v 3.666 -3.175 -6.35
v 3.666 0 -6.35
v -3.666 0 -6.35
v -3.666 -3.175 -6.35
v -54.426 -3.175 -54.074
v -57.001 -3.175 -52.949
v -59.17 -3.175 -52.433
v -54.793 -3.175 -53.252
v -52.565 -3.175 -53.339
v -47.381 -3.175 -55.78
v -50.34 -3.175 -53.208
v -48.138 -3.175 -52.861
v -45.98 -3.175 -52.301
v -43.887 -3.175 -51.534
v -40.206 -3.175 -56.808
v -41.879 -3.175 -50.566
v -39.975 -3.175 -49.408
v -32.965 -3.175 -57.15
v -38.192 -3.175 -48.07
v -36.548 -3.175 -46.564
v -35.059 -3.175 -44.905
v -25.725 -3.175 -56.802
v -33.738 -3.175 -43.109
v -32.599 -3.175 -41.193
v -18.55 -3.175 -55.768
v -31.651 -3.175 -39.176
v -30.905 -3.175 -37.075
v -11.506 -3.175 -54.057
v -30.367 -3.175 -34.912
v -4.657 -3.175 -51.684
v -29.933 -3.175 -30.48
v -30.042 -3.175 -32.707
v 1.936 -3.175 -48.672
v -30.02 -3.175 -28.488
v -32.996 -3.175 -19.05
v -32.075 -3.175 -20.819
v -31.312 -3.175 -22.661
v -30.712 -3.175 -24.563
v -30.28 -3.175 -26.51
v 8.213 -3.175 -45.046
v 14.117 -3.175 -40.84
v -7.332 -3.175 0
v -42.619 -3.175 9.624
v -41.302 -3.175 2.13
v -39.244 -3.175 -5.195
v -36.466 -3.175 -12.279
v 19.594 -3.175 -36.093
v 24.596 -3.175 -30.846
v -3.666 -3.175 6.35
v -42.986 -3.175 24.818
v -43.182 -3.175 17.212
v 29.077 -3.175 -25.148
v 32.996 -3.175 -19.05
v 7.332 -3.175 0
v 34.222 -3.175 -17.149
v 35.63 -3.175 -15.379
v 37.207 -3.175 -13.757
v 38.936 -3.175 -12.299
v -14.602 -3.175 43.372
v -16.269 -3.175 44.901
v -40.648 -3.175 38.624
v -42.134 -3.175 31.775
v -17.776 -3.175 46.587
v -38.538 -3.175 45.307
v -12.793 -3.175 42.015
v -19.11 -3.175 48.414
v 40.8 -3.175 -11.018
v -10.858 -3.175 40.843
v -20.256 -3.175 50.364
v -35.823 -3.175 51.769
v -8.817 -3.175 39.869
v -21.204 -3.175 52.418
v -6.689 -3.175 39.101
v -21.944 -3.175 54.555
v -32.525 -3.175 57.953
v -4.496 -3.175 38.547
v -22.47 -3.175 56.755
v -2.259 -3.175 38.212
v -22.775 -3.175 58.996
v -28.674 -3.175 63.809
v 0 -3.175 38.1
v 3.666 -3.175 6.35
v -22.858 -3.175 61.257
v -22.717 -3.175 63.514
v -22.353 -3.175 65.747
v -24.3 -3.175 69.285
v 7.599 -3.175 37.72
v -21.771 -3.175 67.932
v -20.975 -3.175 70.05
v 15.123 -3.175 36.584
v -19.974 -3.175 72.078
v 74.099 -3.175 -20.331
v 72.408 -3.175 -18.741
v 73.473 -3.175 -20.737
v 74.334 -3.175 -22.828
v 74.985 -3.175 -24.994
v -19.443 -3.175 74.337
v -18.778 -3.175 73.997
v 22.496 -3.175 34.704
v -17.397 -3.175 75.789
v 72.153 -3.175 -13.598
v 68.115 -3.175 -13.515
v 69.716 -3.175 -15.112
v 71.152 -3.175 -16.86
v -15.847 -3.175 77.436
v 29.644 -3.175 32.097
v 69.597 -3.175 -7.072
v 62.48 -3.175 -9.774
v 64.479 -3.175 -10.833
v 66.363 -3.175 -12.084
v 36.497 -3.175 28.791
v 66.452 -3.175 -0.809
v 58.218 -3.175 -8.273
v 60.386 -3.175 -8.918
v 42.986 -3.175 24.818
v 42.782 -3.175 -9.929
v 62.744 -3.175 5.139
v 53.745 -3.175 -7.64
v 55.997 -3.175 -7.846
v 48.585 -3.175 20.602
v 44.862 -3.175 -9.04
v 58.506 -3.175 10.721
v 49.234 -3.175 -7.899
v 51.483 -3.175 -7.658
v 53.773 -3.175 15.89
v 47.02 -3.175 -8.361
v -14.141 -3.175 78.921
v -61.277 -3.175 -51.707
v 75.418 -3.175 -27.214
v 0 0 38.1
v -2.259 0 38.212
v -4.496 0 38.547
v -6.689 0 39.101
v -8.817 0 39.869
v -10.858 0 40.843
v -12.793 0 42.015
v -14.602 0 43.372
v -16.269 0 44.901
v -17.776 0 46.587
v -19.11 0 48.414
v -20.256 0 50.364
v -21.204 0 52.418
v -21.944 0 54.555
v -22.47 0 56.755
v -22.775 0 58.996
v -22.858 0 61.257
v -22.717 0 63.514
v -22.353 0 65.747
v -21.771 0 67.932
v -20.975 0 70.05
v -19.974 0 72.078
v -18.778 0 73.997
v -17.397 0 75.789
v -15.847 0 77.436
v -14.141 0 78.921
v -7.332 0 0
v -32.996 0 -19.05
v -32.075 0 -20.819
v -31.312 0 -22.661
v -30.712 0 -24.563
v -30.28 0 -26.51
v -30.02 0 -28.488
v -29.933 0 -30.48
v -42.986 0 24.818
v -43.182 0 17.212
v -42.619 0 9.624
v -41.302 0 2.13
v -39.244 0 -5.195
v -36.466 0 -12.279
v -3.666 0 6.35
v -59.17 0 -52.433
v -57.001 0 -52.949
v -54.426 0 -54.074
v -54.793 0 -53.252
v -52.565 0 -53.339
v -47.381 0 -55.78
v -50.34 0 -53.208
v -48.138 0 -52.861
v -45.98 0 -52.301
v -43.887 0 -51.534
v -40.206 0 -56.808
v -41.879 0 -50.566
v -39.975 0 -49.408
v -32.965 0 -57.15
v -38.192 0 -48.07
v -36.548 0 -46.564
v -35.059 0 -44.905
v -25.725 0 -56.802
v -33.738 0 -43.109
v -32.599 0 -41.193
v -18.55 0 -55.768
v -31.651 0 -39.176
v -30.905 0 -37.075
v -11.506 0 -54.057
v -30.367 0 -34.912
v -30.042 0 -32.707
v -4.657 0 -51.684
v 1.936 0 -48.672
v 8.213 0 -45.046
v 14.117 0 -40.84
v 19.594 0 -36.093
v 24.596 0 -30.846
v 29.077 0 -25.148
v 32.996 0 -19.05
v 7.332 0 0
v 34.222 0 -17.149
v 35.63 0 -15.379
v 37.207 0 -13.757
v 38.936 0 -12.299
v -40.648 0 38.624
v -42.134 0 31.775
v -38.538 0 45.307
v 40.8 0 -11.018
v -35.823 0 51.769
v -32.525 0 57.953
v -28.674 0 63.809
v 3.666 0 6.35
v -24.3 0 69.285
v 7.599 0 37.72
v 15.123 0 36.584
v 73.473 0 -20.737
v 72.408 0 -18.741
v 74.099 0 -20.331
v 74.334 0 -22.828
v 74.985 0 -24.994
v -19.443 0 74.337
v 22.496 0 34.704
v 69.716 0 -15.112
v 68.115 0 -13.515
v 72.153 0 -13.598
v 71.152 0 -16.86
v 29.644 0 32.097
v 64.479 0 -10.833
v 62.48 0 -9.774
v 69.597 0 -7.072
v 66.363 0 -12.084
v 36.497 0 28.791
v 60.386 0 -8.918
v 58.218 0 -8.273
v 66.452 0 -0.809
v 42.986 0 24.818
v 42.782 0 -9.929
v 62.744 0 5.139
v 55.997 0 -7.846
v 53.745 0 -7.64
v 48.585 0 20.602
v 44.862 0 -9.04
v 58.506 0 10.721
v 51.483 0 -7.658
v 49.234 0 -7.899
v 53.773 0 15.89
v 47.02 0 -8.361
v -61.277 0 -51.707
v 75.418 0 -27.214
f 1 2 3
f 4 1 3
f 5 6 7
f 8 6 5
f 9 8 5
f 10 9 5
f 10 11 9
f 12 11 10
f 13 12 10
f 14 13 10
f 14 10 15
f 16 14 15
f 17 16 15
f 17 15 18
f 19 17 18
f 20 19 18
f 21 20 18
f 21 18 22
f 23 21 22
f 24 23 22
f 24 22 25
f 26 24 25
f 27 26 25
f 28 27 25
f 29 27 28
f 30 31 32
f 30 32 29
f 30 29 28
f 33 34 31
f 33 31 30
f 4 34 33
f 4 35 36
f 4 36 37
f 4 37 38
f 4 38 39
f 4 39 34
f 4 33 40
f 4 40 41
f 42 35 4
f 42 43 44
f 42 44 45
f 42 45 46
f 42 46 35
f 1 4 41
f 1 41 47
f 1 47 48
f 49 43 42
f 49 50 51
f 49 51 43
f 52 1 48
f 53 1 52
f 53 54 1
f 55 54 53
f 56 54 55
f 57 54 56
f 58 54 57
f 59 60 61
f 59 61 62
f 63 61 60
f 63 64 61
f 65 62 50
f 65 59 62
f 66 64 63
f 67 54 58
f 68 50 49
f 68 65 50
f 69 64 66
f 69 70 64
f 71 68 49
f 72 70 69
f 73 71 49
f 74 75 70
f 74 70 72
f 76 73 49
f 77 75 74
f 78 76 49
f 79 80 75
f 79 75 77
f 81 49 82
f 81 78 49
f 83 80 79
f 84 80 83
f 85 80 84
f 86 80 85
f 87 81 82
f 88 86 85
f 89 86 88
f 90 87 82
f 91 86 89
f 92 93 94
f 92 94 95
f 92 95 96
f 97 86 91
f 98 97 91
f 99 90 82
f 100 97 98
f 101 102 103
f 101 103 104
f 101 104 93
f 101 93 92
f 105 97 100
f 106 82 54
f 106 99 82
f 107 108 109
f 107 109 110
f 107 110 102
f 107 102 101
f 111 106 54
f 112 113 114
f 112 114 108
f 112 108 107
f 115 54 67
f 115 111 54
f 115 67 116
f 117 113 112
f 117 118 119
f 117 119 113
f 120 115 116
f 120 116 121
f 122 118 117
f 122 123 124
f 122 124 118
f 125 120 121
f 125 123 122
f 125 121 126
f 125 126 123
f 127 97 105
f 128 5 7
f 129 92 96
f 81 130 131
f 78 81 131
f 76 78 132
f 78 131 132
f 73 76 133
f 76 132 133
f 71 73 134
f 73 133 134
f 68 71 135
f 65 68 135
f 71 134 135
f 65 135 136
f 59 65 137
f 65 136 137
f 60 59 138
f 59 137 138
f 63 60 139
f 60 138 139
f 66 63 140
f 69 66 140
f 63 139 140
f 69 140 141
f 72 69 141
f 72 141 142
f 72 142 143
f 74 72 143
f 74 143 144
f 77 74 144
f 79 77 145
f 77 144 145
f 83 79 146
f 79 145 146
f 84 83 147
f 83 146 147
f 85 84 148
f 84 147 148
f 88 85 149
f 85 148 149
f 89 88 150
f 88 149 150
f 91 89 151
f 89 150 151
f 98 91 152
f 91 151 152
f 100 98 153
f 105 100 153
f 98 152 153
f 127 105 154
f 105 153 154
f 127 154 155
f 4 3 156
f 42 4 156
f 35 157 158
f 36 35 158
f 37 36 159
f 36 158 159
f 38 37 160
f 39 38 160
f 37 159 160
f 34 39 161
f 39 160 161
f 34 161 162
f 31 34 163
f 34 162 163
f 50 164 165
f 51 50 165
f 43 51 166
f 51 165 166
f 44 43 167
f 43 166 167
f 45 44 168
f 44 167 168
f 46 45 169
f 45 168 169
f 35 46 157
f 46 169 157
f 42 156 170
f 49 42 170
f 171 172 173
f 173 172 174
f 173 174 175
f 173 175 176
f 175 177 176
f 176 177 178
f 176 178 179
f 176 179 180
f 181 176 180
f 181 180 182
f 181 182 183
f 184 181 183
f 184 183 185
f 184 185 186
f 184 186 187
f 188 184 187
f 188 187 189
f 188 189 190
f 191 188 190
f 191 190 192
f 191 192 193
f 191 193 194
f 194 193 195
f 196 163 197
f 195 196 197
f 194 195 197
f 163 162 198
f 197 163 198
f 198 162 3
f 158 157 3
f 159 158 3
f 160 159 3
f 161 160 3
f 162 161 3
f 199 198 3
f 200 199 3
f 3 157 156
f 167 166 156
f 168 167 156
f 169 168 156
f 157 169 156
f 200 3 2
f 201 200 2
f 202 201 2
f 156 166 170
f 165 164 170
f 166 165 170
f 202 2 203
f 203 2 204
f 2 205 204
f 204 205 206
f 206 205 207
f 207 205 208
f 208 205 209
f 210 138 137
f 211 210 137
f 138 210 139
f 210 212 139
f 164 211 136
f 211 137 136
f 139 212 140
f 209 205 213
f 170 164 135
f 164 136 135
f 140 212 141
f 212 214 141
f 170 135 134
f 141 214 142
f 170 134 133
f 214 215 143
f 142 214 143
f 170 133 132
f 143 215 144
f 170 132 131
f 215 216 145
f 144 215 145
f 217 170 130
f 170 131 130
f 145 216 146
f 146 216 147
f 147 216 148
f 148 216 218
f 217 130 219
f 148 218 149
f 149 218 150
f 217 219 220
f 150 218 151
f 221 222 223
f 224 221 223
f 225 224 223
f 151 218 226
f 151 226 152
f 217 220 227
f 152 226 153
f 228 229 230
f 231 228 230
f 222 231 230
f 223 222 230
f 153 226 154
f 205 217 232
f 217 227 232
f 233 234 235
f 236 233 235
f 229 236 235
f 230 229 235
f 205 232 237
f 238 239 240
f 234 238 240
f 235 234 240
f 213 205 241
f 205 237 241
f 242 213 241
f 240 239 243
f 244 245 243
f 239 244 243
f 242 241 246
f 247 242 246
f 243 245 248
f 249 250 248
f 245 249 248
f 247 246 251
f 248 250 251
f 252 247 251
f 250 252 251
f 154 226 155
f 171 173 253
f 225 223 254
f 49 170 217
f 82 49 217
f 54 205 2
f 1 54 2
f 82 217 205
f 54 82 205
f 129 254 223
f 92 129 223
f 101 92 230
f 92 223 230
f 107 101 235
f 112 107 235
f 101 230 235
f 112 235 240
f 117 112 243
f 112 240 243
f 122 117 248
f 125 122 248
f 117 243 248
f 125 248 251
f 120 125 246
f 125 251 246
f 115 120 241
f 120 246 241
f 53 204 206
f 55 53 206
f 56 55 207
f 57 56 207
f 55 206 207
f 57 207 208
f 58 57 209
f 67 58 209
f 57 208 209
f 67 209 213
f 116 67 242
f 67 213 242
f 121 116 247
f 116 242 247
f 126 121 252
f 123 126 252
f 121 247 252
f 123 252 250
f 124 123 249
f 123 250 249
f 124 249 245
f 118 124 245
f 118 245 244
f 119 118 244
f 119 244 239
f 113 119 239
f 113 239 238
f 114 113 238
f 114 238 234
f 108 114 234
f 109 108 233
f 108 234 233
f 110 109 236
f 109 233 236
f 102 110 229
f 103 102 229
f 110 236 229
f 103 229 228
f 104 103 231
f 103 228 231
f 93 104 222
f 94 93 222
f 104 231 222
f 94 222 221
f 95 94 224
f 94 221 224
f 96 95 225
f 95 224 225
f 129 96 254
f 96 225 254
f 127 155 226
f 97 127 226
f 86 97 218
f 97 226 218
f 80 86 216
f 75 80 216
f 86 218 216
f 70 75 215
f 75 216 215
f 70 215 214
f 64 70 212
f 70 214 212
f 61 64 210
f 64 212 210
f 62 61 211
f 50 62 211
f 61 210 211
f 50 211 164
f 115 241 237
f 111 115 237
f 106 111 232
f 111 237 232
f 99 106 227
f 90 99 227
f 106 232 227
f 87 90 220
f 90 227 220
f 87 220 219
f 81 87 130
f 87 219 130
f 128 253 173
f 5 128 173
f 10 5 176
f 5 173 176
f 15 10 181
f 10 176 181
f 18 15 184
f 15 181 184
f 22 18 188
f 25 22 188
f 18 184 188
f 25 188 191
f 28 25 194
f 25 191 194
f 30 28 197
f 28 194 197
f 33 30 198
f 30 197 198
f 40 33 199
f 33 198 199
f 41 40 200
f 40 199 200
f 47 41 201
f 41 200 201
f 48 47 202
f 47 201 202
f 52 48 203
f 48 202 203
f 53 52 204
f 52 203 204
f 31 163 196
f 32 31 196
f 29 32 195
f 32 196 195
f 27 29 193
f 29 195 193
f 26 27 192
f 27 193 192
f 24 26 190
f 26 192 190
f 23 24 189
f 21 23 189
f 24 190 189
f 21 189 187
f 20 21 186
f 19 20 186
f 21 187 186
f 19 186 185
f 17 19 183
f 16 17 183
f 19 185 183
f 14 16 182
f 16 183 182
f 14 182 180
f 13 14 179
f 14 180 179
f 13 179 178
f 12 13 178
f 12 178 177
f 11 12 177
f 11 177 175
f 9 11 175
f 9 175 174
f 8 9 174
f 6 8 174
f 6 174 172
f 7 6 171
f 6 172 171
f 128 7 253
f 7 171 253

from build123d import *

# Parameters (mm, degrees)
F1_DEPTH = 3.175


with BuildPart() as f1:
    # F0 (on Front) → F1 (new body)
    with BuildSketch(Plane.XZ):
        with BuildLine():
            ThreePointArc((32.9955675162, -19.0500006373), (36.8017738864, -9.8610059738), (38.1, 0))
            ThreePointArc((38.1, 0), (26.9407683703, 26.9407683561), (2.01e-08, 38.1))
            ThreePointArc((2.01e-08, 38.1), (-32.9955680289, 19.0499997494), (-32.9955675847, -19.0500005187))
            ThreePointArc((-32.9955675847, -19.0500005187), (-6.85e-08, -38.1), (32.9955675162, -19.0500006373))
        make_face()
        Polygon((3.6661742094, 6.35), (7.3323484187, 0), (3.6661742094, -6.35), (-3.6661742094, -6.35), (-7.3323484187, 0), (-3.6661742094, 6.35), align=None, mode=Mode.SUBTRACT)
        with BuildLine():
            ThreePointArc((2.01e-08, 38.1), (26.9407683703, 26.9407683561), (38.1, 0))
            ThreePointArc((38.1, 0), (36.8017738864, -9.8610059738), (32.9955675162, -19.0500006373))
            ThreePointArc((32.9955675162, -19.0500006373), (40.6079799838, -0.6720115922), (43.2044321158, 19.05))
            ThreePointArc((43.2044321158, 19.05), (43.1497599719, 21.9360086092), (42.9858219927, 24.8178758988))
            ThreePointArc((42.9858219927, 24.8178758988), (22.4955313049, 34.7037847321), (2.01e-08, 38.1))
        make_face()
        with BuildLine():
            ThreePointArc((-32.9955675847, -19.0500005187), (-32.9955680289, 19.0499997494), (2.01e-08, 38.1))
            ThreePointArc((2.01e-08, 38.1), (-22.4955312856, 34.703784738), (-42.9858219927, 24.8178758988))
            ThreePointArc((-42.9858219927, 24.8178758988), (-41.3021247691, 2.1298089138), (-32.9955675847, -19.0500005187))
        make_face()
        with BuildLine():
            ThreePointArc((-42.9858219927, 24.8178758988), (-22.4955312856, 34.703784738), (2.01e-08, 38.1))
            ThreePointArc((2.01e-08, 38.1), (-21.6006695494, 53.4773083041), (-14.1409580475, 78.92142827))
            ThreePointArc((-14.1409580475, 78.92142827), (-34.2450737922, 54.8987950557), (-42.9858219927, 24.8178758988))
        make_face()
        with BuildLine():
            ThreePointArc((0, -49.6357517976), (18.8065932705, -36.833594191), (32.9955675162, -19.0500006373))
            ThreePointArc((32.9955675162, -19.0500006373), (-6.85e-08, -38.1), (-32.9955675847, -19.0500005187))
            ThreePointArc((-32.9955675847, -19.0500005187), (-18.8065933208, -36.8335941444), (0, -49.6357517976))
        make_face()
        with BuildLine():
            ThreePointArc((43.2044321158, 19.05), (40.6079799838, -0.6720115922), (32.9955675162, -19.0500006373))
            ThreePointArc((32.9955675162, -19.0500006373), (57.1130420252, -8.0319255321), (75.4184408331, -27.2142854025))
            ThreePointArc((75.4184408331, -27.2142854025), (64.6662880971, 2.2077062576), (42.9858219927, 24.8178758988))
            ThreePointArc((42.9858219927, 24.8178758988), (43.1497599719, 21.9360086092), (43.2044321158, 19.05))
        make_face()
        with BuildLine():
            ThreePointArc((0, -49.6357517976), (-18.8065933208, -36.8335941444), (-32.9955675847, -19.0500005187))
            ThreePointArc((-32.9955675847, -19.0500005187), (-30.7118441482, -24.5633969182), (-29.9329086147, -30.48))
            ThreePointArc((-29.9329086147, -30.48), (-39.9745190131, -49.4079816151), (-61.2774832447, -51.7071428447))
            ThreePointArc((-61.2774832447, -51.7071428447), (-30.4212145195, -57.1065013952), (0, -49.6357517976))
        make_face()
    extrude(amount=F1_DEPTH)


solid = f1.part
